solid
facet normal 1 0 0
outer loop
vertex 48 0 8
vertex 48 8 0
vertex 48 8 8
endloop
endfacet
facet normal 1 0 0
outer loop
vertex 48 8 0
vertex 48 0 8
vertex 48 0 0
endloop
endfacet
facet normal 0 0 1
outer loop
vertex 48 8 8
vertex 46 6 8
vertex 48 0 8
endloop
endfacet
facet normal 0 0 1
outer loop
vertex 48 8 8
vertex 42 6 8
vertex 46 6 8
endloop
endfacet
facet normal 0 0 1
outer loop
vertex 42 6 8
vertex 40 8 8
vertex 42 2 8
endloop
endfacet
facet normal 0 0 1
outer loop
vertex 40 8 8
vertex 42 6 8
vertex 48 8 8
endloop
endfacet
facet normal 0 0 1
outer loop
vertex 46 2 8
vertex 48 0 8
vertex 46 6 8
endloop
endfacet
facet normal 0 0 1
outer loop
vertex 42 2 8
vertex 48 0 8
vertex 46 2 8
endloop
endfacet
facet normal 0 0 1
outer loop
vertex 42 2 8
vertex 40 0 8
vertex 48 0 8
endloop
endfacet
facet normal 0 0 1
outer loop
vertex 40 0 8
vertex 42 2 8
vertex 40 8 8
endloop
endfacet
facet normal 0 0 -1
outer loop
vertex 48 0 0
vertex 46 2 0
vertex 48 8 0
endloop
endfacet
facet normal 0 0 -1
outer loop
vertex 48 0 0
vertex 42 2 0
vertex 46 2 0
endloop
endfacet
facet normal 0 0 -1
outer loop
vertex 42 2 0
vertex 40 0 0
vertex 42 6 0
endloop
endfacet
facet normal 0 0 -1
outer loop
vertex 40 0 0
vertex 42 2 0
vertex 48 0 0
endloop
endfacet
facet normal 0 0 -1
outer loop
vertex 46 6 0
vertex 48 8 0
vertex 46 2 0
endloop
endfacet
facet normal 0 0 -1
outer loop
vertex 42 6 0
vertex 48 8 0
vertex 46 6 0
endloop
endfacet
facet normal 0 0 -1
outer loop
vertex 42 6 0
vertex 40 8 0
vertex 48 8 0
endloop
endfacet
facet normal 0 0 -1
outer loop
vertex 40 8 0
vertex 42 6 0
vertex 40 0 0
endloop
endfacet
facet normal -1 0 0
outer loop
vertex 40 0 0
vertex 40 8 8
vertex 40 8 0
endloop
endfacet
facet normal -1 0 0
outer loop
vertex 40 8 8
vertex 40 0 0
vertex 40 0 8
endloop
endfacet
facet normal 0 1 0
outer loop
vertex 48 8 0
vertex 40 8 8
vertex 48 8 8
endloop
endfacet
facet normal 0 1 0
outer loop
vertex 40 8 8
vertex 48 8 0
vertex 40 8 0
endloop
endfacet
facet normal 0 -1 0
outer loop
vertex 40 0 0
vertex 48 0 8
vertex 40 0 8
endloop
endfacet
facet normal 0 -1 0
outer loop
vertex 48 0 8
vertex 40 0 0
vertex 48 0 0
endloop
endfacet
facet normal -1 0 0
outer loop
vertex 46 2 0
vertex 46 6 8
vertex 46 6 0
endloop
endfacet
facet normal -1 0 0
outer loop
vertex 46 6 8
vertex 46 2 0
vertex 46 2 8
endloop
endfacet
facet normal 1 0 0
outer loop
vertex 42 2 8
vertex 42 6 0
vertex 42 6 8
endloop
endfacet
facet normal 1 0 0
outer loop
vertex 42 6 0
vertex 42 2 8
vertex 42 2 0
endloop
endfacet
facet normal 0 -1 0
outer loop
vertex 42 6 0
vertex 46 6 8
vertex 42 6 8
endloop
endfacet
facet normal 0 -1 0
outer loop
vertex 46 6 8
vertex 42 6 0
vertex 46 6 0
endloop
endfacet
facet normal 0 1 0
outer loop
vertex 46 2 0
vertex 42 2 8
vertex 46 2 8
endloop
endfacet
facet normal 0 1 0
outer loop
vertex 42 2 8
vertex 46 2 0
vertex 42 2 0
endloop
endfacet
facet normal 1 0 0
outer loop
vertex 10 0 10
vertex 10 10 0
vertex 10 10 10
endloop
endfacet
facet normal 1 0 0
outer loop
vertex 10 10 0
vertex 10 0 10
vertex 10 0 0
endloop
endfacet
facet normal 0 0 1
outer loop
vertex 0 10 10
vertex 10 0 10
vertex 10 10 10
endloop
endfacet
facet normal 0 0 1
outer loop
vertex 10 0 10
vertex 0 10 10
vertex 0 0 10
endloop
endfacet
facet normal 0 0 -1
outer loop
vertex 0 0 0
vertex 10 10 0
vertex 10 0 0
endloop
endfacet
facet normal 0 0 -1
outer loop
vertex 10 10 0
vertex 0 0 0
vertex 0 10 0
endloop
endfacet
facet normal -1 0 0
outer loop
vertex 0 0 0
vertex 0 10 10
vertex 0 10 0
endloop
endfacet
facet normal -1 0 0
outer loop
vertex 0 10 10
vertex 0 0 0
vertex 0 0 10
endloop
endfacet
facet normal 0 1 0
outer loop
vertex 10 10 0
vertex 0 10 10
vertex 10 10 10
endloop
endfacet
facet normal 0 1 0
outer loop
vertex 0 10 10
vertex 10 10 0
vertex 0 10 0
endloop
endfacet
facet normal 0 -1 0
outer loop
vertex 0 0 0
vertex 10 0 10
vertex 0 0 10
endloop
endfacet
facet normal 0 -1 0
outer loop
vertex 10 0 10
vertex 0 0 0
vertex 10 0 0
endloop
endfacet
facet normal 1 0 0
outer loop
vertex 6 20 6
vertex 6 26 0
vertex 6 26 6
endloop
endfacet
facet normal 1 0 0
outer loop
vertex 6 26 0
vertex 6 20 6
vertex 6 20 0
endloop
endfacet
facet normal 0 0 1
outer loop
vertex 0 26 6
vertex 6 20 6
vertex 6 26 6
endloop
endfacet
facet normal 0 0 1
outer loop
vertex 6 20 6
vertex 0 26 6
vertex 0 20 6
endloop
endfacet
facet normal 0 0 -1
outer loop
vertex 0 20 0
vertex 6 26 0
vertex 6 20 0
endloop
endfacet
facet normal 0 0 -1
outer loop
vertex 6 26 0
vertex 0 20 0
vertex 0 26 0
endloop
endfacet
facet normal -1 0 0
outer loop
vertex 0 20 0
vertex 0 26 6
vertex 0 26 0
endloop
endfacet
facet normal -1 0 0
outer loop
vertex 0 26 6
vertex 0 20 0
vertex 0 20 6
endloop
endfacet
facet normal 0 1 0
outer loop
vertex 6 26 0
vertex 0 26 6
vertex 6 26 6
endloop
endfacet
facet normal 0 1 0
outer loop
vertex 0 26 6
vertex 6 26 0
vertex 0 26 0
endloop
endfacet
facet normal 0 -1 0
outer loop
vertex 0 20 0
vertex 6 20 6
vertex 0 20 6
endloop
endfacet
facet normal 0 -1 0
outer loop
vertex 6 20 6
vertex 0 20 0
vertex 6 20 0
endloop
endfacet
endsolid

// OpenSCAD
color("red") cube(10);
%color("blue") translate([20,0,0]) cube(5);
#color("green") translate([0,20,0]) cube(6);
*color("yellow") translate([20,20,0]) cube(7);
difference() { color("teal") translate([40,0,0]) cube(8); #color("pink") translate([42,2,-1]) cube([4,4,10]); }
